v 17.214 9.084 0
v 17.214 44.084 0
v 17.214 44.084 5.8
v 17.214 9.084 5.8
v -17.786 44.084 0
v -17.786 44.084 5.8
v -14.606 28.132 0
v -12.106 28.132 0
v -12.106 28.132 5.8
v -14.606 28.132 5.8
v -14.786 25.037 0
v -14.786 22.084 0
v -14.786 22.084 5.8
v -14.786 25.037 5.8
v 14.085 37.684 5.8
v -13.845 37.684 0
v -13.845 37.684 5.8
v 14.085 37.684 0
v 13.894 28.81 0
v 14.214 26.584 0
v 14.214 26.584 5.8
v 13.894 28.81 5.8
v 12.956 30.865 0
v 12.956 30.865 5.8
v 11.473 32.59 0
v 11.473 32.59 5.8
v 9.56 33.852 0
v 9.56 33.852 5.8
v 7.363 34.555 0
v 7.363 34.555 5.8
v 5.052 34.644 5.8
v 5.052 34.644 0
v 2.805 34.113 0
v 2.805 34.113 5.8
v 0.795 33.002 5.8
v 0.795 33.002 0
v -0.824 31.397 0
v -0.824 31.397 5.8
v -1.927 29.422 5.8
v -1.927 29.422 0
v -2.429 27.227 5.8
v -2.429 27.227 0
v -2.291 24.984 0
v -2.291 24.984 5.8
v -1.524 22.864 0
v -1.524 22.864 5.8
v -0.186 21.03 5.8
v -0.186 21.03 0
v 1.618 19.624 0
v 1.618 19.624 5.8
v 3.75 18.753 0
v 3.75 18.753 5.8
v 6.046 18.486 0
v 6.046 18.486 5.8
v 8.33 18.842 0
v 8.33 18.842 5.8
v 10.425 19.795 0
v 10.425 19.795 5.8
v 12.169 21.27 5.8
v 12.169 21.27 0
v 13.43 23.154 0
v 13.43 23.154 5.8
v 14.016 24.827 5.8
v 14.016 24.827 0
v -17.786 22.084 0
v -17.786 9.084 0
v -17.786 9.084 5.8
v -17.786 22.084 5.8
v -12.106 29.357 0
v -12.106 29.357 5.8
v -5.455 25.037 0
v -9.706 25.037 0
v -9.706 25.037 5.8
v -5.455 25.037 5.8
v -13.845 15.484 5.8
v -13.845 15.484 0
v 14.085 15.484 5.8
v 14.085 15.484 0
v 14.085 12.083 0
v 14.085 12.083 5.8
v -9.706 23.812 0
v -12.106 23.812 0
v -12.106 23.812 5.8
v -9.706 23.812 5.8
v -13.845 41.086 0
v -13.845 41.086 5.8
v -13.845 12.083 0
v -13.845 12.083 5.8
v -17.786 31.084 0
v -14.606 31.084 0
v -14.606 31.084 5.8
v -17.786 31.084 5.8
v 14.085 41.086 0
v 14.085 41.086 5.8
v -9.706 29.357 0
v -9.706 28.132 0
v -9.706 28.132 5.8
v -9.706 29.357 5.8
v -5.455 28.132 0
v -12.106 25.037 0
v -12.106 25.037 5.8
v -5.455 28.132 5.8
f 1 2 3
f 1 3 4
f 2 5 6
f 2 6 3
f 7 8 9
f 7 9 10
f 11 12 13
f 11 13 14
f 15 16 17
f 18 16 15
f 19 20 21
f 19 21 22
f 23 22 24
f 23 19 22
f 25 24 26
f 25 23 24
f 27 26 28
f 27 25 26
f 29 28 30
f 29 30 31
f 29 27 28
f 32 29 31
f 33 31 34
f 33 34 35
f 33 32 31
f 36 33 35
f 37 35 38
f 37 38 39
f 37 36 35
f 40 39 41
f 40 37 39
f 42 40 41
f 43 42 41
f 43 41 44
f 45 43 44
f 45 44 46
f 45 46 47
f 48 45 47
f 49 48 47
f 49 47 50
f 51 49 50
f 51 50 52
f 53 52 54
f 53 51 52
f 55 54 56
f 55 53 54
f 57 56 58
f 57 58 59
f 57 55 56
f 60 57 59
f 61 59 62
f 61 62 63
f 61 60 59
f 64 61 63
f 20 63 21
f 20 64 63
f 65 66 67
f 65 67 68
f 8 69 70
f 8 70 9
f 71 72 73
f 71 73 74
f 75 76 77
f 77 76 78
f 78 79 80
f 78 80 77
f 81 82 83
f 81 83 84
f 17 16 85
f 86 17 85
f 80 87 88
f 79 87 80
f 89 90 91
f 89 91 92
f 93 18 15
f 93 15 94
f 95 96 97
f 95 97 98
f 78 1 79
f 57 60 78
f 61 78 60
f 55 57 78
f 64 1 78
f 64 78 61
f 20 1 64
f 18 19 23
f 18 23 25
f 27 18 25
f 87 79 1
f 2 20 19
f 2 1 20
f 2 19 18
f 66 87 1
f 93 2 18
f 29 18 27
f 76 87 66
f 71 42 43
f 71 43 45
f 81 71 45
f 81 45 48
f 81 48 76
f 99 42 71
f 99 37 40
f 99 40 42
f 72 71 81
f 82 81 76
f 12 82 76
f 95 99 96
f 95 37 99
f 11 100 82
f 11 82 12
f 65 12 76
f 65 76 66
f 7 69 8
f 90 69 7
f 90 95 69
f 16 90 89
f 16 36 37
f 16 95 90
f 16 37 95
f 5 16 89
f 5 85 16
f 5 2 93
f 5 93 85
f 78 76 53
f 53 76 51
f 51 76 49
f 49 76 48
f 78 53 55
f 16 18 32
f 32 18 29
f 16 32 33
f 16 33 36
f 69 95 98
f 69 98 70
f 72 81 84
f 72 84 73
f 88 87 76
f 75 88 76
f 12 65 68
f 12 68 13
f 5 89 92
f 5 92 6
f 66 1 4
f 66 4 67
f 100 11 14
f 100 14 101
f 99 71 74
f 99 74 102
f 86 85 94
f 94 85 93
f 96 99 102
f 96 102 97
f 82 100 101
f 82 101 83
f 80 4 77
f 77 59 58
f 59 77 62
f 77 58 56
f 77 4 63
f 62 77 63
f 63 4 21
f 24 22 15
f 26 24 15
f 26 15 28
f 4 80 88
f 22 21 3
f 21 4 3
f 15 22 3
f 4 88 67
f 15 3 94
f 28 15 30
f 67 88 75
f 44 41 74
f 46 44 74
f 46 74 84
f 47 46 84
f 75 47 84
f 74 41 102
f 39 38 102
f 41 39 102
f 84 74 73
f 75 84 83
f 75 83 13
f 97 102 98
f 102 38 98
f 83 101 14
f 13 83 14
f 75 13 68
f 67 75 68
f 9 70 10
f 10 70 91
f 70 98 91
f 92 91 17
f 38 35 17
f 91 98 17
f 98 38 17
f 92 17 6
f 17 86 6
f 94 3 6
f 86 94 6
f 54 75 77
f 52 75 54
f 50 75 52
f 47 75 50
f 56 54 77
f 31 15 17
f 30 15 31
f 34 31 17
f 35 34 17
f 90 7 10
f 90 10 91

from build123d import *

# Parameters (mm, degrees)
SKETCH1_RX          = 8.334694939
SKETCH1_RY          = 8.1
SKETCH1_W           = 27.929114048
SKETCH1_H           = 3.401184302
SKETCH1_H_2         = 3.401184301
BOSS_EXTRUDE1_DEPTH = 5.8


with BuildPart() as part:
    # Sketch1 → Boss-Extrude1 (new body)
    with BuildSketch(Plane.XY):
        Polygon((-5.45496555, 25.036590129), (-5.45496555, 28.132290129), (-9.705575673, 28.132290129), (-9.705575673, 29.356690129), (-12.105575673, 29.356690129), (-12.105575673, 28.132290129), (-14.605575673, 28.132290129), (-14.605575673, 31.084440129), (-17.785575673, 31.084440129), (-17.785575673, 44.084440129), (17.214424327, 44.084440129), (17.214424327, 9.084440129), (-17.785575673, 9.084440129), (-17.785575673, 22.084440129), (-14.785575673, 22.084440129), (-14.785575673, 25.036590129), (-12.105575673, 25.036590129), (-12.105575673, 23.812190129), (-9.705575673, 23.812190129), (-9.705575673, 25.036590129), align=None)
        with Locations((5.879729388, 26.584440129)):
            Ellipse(SKETCH1_RX, SKETCH1_RY, mode=Mode.SUBTRACT)
        with Locations((0.120011131, 39.38503228)):
            Rectangle(SKETCH1_W, SKETCH1_H, mode=Mode.SUBTRACT)
        with Locations((0.120011131, 13.783847979)):
            Rectangle(SKETCH1_W, SKETCH1_H_2, mode=Mode.SUBTRACT)
    extrude(amount=BOSS_EXTRUDE1_DEPTH)


solid = part.part
